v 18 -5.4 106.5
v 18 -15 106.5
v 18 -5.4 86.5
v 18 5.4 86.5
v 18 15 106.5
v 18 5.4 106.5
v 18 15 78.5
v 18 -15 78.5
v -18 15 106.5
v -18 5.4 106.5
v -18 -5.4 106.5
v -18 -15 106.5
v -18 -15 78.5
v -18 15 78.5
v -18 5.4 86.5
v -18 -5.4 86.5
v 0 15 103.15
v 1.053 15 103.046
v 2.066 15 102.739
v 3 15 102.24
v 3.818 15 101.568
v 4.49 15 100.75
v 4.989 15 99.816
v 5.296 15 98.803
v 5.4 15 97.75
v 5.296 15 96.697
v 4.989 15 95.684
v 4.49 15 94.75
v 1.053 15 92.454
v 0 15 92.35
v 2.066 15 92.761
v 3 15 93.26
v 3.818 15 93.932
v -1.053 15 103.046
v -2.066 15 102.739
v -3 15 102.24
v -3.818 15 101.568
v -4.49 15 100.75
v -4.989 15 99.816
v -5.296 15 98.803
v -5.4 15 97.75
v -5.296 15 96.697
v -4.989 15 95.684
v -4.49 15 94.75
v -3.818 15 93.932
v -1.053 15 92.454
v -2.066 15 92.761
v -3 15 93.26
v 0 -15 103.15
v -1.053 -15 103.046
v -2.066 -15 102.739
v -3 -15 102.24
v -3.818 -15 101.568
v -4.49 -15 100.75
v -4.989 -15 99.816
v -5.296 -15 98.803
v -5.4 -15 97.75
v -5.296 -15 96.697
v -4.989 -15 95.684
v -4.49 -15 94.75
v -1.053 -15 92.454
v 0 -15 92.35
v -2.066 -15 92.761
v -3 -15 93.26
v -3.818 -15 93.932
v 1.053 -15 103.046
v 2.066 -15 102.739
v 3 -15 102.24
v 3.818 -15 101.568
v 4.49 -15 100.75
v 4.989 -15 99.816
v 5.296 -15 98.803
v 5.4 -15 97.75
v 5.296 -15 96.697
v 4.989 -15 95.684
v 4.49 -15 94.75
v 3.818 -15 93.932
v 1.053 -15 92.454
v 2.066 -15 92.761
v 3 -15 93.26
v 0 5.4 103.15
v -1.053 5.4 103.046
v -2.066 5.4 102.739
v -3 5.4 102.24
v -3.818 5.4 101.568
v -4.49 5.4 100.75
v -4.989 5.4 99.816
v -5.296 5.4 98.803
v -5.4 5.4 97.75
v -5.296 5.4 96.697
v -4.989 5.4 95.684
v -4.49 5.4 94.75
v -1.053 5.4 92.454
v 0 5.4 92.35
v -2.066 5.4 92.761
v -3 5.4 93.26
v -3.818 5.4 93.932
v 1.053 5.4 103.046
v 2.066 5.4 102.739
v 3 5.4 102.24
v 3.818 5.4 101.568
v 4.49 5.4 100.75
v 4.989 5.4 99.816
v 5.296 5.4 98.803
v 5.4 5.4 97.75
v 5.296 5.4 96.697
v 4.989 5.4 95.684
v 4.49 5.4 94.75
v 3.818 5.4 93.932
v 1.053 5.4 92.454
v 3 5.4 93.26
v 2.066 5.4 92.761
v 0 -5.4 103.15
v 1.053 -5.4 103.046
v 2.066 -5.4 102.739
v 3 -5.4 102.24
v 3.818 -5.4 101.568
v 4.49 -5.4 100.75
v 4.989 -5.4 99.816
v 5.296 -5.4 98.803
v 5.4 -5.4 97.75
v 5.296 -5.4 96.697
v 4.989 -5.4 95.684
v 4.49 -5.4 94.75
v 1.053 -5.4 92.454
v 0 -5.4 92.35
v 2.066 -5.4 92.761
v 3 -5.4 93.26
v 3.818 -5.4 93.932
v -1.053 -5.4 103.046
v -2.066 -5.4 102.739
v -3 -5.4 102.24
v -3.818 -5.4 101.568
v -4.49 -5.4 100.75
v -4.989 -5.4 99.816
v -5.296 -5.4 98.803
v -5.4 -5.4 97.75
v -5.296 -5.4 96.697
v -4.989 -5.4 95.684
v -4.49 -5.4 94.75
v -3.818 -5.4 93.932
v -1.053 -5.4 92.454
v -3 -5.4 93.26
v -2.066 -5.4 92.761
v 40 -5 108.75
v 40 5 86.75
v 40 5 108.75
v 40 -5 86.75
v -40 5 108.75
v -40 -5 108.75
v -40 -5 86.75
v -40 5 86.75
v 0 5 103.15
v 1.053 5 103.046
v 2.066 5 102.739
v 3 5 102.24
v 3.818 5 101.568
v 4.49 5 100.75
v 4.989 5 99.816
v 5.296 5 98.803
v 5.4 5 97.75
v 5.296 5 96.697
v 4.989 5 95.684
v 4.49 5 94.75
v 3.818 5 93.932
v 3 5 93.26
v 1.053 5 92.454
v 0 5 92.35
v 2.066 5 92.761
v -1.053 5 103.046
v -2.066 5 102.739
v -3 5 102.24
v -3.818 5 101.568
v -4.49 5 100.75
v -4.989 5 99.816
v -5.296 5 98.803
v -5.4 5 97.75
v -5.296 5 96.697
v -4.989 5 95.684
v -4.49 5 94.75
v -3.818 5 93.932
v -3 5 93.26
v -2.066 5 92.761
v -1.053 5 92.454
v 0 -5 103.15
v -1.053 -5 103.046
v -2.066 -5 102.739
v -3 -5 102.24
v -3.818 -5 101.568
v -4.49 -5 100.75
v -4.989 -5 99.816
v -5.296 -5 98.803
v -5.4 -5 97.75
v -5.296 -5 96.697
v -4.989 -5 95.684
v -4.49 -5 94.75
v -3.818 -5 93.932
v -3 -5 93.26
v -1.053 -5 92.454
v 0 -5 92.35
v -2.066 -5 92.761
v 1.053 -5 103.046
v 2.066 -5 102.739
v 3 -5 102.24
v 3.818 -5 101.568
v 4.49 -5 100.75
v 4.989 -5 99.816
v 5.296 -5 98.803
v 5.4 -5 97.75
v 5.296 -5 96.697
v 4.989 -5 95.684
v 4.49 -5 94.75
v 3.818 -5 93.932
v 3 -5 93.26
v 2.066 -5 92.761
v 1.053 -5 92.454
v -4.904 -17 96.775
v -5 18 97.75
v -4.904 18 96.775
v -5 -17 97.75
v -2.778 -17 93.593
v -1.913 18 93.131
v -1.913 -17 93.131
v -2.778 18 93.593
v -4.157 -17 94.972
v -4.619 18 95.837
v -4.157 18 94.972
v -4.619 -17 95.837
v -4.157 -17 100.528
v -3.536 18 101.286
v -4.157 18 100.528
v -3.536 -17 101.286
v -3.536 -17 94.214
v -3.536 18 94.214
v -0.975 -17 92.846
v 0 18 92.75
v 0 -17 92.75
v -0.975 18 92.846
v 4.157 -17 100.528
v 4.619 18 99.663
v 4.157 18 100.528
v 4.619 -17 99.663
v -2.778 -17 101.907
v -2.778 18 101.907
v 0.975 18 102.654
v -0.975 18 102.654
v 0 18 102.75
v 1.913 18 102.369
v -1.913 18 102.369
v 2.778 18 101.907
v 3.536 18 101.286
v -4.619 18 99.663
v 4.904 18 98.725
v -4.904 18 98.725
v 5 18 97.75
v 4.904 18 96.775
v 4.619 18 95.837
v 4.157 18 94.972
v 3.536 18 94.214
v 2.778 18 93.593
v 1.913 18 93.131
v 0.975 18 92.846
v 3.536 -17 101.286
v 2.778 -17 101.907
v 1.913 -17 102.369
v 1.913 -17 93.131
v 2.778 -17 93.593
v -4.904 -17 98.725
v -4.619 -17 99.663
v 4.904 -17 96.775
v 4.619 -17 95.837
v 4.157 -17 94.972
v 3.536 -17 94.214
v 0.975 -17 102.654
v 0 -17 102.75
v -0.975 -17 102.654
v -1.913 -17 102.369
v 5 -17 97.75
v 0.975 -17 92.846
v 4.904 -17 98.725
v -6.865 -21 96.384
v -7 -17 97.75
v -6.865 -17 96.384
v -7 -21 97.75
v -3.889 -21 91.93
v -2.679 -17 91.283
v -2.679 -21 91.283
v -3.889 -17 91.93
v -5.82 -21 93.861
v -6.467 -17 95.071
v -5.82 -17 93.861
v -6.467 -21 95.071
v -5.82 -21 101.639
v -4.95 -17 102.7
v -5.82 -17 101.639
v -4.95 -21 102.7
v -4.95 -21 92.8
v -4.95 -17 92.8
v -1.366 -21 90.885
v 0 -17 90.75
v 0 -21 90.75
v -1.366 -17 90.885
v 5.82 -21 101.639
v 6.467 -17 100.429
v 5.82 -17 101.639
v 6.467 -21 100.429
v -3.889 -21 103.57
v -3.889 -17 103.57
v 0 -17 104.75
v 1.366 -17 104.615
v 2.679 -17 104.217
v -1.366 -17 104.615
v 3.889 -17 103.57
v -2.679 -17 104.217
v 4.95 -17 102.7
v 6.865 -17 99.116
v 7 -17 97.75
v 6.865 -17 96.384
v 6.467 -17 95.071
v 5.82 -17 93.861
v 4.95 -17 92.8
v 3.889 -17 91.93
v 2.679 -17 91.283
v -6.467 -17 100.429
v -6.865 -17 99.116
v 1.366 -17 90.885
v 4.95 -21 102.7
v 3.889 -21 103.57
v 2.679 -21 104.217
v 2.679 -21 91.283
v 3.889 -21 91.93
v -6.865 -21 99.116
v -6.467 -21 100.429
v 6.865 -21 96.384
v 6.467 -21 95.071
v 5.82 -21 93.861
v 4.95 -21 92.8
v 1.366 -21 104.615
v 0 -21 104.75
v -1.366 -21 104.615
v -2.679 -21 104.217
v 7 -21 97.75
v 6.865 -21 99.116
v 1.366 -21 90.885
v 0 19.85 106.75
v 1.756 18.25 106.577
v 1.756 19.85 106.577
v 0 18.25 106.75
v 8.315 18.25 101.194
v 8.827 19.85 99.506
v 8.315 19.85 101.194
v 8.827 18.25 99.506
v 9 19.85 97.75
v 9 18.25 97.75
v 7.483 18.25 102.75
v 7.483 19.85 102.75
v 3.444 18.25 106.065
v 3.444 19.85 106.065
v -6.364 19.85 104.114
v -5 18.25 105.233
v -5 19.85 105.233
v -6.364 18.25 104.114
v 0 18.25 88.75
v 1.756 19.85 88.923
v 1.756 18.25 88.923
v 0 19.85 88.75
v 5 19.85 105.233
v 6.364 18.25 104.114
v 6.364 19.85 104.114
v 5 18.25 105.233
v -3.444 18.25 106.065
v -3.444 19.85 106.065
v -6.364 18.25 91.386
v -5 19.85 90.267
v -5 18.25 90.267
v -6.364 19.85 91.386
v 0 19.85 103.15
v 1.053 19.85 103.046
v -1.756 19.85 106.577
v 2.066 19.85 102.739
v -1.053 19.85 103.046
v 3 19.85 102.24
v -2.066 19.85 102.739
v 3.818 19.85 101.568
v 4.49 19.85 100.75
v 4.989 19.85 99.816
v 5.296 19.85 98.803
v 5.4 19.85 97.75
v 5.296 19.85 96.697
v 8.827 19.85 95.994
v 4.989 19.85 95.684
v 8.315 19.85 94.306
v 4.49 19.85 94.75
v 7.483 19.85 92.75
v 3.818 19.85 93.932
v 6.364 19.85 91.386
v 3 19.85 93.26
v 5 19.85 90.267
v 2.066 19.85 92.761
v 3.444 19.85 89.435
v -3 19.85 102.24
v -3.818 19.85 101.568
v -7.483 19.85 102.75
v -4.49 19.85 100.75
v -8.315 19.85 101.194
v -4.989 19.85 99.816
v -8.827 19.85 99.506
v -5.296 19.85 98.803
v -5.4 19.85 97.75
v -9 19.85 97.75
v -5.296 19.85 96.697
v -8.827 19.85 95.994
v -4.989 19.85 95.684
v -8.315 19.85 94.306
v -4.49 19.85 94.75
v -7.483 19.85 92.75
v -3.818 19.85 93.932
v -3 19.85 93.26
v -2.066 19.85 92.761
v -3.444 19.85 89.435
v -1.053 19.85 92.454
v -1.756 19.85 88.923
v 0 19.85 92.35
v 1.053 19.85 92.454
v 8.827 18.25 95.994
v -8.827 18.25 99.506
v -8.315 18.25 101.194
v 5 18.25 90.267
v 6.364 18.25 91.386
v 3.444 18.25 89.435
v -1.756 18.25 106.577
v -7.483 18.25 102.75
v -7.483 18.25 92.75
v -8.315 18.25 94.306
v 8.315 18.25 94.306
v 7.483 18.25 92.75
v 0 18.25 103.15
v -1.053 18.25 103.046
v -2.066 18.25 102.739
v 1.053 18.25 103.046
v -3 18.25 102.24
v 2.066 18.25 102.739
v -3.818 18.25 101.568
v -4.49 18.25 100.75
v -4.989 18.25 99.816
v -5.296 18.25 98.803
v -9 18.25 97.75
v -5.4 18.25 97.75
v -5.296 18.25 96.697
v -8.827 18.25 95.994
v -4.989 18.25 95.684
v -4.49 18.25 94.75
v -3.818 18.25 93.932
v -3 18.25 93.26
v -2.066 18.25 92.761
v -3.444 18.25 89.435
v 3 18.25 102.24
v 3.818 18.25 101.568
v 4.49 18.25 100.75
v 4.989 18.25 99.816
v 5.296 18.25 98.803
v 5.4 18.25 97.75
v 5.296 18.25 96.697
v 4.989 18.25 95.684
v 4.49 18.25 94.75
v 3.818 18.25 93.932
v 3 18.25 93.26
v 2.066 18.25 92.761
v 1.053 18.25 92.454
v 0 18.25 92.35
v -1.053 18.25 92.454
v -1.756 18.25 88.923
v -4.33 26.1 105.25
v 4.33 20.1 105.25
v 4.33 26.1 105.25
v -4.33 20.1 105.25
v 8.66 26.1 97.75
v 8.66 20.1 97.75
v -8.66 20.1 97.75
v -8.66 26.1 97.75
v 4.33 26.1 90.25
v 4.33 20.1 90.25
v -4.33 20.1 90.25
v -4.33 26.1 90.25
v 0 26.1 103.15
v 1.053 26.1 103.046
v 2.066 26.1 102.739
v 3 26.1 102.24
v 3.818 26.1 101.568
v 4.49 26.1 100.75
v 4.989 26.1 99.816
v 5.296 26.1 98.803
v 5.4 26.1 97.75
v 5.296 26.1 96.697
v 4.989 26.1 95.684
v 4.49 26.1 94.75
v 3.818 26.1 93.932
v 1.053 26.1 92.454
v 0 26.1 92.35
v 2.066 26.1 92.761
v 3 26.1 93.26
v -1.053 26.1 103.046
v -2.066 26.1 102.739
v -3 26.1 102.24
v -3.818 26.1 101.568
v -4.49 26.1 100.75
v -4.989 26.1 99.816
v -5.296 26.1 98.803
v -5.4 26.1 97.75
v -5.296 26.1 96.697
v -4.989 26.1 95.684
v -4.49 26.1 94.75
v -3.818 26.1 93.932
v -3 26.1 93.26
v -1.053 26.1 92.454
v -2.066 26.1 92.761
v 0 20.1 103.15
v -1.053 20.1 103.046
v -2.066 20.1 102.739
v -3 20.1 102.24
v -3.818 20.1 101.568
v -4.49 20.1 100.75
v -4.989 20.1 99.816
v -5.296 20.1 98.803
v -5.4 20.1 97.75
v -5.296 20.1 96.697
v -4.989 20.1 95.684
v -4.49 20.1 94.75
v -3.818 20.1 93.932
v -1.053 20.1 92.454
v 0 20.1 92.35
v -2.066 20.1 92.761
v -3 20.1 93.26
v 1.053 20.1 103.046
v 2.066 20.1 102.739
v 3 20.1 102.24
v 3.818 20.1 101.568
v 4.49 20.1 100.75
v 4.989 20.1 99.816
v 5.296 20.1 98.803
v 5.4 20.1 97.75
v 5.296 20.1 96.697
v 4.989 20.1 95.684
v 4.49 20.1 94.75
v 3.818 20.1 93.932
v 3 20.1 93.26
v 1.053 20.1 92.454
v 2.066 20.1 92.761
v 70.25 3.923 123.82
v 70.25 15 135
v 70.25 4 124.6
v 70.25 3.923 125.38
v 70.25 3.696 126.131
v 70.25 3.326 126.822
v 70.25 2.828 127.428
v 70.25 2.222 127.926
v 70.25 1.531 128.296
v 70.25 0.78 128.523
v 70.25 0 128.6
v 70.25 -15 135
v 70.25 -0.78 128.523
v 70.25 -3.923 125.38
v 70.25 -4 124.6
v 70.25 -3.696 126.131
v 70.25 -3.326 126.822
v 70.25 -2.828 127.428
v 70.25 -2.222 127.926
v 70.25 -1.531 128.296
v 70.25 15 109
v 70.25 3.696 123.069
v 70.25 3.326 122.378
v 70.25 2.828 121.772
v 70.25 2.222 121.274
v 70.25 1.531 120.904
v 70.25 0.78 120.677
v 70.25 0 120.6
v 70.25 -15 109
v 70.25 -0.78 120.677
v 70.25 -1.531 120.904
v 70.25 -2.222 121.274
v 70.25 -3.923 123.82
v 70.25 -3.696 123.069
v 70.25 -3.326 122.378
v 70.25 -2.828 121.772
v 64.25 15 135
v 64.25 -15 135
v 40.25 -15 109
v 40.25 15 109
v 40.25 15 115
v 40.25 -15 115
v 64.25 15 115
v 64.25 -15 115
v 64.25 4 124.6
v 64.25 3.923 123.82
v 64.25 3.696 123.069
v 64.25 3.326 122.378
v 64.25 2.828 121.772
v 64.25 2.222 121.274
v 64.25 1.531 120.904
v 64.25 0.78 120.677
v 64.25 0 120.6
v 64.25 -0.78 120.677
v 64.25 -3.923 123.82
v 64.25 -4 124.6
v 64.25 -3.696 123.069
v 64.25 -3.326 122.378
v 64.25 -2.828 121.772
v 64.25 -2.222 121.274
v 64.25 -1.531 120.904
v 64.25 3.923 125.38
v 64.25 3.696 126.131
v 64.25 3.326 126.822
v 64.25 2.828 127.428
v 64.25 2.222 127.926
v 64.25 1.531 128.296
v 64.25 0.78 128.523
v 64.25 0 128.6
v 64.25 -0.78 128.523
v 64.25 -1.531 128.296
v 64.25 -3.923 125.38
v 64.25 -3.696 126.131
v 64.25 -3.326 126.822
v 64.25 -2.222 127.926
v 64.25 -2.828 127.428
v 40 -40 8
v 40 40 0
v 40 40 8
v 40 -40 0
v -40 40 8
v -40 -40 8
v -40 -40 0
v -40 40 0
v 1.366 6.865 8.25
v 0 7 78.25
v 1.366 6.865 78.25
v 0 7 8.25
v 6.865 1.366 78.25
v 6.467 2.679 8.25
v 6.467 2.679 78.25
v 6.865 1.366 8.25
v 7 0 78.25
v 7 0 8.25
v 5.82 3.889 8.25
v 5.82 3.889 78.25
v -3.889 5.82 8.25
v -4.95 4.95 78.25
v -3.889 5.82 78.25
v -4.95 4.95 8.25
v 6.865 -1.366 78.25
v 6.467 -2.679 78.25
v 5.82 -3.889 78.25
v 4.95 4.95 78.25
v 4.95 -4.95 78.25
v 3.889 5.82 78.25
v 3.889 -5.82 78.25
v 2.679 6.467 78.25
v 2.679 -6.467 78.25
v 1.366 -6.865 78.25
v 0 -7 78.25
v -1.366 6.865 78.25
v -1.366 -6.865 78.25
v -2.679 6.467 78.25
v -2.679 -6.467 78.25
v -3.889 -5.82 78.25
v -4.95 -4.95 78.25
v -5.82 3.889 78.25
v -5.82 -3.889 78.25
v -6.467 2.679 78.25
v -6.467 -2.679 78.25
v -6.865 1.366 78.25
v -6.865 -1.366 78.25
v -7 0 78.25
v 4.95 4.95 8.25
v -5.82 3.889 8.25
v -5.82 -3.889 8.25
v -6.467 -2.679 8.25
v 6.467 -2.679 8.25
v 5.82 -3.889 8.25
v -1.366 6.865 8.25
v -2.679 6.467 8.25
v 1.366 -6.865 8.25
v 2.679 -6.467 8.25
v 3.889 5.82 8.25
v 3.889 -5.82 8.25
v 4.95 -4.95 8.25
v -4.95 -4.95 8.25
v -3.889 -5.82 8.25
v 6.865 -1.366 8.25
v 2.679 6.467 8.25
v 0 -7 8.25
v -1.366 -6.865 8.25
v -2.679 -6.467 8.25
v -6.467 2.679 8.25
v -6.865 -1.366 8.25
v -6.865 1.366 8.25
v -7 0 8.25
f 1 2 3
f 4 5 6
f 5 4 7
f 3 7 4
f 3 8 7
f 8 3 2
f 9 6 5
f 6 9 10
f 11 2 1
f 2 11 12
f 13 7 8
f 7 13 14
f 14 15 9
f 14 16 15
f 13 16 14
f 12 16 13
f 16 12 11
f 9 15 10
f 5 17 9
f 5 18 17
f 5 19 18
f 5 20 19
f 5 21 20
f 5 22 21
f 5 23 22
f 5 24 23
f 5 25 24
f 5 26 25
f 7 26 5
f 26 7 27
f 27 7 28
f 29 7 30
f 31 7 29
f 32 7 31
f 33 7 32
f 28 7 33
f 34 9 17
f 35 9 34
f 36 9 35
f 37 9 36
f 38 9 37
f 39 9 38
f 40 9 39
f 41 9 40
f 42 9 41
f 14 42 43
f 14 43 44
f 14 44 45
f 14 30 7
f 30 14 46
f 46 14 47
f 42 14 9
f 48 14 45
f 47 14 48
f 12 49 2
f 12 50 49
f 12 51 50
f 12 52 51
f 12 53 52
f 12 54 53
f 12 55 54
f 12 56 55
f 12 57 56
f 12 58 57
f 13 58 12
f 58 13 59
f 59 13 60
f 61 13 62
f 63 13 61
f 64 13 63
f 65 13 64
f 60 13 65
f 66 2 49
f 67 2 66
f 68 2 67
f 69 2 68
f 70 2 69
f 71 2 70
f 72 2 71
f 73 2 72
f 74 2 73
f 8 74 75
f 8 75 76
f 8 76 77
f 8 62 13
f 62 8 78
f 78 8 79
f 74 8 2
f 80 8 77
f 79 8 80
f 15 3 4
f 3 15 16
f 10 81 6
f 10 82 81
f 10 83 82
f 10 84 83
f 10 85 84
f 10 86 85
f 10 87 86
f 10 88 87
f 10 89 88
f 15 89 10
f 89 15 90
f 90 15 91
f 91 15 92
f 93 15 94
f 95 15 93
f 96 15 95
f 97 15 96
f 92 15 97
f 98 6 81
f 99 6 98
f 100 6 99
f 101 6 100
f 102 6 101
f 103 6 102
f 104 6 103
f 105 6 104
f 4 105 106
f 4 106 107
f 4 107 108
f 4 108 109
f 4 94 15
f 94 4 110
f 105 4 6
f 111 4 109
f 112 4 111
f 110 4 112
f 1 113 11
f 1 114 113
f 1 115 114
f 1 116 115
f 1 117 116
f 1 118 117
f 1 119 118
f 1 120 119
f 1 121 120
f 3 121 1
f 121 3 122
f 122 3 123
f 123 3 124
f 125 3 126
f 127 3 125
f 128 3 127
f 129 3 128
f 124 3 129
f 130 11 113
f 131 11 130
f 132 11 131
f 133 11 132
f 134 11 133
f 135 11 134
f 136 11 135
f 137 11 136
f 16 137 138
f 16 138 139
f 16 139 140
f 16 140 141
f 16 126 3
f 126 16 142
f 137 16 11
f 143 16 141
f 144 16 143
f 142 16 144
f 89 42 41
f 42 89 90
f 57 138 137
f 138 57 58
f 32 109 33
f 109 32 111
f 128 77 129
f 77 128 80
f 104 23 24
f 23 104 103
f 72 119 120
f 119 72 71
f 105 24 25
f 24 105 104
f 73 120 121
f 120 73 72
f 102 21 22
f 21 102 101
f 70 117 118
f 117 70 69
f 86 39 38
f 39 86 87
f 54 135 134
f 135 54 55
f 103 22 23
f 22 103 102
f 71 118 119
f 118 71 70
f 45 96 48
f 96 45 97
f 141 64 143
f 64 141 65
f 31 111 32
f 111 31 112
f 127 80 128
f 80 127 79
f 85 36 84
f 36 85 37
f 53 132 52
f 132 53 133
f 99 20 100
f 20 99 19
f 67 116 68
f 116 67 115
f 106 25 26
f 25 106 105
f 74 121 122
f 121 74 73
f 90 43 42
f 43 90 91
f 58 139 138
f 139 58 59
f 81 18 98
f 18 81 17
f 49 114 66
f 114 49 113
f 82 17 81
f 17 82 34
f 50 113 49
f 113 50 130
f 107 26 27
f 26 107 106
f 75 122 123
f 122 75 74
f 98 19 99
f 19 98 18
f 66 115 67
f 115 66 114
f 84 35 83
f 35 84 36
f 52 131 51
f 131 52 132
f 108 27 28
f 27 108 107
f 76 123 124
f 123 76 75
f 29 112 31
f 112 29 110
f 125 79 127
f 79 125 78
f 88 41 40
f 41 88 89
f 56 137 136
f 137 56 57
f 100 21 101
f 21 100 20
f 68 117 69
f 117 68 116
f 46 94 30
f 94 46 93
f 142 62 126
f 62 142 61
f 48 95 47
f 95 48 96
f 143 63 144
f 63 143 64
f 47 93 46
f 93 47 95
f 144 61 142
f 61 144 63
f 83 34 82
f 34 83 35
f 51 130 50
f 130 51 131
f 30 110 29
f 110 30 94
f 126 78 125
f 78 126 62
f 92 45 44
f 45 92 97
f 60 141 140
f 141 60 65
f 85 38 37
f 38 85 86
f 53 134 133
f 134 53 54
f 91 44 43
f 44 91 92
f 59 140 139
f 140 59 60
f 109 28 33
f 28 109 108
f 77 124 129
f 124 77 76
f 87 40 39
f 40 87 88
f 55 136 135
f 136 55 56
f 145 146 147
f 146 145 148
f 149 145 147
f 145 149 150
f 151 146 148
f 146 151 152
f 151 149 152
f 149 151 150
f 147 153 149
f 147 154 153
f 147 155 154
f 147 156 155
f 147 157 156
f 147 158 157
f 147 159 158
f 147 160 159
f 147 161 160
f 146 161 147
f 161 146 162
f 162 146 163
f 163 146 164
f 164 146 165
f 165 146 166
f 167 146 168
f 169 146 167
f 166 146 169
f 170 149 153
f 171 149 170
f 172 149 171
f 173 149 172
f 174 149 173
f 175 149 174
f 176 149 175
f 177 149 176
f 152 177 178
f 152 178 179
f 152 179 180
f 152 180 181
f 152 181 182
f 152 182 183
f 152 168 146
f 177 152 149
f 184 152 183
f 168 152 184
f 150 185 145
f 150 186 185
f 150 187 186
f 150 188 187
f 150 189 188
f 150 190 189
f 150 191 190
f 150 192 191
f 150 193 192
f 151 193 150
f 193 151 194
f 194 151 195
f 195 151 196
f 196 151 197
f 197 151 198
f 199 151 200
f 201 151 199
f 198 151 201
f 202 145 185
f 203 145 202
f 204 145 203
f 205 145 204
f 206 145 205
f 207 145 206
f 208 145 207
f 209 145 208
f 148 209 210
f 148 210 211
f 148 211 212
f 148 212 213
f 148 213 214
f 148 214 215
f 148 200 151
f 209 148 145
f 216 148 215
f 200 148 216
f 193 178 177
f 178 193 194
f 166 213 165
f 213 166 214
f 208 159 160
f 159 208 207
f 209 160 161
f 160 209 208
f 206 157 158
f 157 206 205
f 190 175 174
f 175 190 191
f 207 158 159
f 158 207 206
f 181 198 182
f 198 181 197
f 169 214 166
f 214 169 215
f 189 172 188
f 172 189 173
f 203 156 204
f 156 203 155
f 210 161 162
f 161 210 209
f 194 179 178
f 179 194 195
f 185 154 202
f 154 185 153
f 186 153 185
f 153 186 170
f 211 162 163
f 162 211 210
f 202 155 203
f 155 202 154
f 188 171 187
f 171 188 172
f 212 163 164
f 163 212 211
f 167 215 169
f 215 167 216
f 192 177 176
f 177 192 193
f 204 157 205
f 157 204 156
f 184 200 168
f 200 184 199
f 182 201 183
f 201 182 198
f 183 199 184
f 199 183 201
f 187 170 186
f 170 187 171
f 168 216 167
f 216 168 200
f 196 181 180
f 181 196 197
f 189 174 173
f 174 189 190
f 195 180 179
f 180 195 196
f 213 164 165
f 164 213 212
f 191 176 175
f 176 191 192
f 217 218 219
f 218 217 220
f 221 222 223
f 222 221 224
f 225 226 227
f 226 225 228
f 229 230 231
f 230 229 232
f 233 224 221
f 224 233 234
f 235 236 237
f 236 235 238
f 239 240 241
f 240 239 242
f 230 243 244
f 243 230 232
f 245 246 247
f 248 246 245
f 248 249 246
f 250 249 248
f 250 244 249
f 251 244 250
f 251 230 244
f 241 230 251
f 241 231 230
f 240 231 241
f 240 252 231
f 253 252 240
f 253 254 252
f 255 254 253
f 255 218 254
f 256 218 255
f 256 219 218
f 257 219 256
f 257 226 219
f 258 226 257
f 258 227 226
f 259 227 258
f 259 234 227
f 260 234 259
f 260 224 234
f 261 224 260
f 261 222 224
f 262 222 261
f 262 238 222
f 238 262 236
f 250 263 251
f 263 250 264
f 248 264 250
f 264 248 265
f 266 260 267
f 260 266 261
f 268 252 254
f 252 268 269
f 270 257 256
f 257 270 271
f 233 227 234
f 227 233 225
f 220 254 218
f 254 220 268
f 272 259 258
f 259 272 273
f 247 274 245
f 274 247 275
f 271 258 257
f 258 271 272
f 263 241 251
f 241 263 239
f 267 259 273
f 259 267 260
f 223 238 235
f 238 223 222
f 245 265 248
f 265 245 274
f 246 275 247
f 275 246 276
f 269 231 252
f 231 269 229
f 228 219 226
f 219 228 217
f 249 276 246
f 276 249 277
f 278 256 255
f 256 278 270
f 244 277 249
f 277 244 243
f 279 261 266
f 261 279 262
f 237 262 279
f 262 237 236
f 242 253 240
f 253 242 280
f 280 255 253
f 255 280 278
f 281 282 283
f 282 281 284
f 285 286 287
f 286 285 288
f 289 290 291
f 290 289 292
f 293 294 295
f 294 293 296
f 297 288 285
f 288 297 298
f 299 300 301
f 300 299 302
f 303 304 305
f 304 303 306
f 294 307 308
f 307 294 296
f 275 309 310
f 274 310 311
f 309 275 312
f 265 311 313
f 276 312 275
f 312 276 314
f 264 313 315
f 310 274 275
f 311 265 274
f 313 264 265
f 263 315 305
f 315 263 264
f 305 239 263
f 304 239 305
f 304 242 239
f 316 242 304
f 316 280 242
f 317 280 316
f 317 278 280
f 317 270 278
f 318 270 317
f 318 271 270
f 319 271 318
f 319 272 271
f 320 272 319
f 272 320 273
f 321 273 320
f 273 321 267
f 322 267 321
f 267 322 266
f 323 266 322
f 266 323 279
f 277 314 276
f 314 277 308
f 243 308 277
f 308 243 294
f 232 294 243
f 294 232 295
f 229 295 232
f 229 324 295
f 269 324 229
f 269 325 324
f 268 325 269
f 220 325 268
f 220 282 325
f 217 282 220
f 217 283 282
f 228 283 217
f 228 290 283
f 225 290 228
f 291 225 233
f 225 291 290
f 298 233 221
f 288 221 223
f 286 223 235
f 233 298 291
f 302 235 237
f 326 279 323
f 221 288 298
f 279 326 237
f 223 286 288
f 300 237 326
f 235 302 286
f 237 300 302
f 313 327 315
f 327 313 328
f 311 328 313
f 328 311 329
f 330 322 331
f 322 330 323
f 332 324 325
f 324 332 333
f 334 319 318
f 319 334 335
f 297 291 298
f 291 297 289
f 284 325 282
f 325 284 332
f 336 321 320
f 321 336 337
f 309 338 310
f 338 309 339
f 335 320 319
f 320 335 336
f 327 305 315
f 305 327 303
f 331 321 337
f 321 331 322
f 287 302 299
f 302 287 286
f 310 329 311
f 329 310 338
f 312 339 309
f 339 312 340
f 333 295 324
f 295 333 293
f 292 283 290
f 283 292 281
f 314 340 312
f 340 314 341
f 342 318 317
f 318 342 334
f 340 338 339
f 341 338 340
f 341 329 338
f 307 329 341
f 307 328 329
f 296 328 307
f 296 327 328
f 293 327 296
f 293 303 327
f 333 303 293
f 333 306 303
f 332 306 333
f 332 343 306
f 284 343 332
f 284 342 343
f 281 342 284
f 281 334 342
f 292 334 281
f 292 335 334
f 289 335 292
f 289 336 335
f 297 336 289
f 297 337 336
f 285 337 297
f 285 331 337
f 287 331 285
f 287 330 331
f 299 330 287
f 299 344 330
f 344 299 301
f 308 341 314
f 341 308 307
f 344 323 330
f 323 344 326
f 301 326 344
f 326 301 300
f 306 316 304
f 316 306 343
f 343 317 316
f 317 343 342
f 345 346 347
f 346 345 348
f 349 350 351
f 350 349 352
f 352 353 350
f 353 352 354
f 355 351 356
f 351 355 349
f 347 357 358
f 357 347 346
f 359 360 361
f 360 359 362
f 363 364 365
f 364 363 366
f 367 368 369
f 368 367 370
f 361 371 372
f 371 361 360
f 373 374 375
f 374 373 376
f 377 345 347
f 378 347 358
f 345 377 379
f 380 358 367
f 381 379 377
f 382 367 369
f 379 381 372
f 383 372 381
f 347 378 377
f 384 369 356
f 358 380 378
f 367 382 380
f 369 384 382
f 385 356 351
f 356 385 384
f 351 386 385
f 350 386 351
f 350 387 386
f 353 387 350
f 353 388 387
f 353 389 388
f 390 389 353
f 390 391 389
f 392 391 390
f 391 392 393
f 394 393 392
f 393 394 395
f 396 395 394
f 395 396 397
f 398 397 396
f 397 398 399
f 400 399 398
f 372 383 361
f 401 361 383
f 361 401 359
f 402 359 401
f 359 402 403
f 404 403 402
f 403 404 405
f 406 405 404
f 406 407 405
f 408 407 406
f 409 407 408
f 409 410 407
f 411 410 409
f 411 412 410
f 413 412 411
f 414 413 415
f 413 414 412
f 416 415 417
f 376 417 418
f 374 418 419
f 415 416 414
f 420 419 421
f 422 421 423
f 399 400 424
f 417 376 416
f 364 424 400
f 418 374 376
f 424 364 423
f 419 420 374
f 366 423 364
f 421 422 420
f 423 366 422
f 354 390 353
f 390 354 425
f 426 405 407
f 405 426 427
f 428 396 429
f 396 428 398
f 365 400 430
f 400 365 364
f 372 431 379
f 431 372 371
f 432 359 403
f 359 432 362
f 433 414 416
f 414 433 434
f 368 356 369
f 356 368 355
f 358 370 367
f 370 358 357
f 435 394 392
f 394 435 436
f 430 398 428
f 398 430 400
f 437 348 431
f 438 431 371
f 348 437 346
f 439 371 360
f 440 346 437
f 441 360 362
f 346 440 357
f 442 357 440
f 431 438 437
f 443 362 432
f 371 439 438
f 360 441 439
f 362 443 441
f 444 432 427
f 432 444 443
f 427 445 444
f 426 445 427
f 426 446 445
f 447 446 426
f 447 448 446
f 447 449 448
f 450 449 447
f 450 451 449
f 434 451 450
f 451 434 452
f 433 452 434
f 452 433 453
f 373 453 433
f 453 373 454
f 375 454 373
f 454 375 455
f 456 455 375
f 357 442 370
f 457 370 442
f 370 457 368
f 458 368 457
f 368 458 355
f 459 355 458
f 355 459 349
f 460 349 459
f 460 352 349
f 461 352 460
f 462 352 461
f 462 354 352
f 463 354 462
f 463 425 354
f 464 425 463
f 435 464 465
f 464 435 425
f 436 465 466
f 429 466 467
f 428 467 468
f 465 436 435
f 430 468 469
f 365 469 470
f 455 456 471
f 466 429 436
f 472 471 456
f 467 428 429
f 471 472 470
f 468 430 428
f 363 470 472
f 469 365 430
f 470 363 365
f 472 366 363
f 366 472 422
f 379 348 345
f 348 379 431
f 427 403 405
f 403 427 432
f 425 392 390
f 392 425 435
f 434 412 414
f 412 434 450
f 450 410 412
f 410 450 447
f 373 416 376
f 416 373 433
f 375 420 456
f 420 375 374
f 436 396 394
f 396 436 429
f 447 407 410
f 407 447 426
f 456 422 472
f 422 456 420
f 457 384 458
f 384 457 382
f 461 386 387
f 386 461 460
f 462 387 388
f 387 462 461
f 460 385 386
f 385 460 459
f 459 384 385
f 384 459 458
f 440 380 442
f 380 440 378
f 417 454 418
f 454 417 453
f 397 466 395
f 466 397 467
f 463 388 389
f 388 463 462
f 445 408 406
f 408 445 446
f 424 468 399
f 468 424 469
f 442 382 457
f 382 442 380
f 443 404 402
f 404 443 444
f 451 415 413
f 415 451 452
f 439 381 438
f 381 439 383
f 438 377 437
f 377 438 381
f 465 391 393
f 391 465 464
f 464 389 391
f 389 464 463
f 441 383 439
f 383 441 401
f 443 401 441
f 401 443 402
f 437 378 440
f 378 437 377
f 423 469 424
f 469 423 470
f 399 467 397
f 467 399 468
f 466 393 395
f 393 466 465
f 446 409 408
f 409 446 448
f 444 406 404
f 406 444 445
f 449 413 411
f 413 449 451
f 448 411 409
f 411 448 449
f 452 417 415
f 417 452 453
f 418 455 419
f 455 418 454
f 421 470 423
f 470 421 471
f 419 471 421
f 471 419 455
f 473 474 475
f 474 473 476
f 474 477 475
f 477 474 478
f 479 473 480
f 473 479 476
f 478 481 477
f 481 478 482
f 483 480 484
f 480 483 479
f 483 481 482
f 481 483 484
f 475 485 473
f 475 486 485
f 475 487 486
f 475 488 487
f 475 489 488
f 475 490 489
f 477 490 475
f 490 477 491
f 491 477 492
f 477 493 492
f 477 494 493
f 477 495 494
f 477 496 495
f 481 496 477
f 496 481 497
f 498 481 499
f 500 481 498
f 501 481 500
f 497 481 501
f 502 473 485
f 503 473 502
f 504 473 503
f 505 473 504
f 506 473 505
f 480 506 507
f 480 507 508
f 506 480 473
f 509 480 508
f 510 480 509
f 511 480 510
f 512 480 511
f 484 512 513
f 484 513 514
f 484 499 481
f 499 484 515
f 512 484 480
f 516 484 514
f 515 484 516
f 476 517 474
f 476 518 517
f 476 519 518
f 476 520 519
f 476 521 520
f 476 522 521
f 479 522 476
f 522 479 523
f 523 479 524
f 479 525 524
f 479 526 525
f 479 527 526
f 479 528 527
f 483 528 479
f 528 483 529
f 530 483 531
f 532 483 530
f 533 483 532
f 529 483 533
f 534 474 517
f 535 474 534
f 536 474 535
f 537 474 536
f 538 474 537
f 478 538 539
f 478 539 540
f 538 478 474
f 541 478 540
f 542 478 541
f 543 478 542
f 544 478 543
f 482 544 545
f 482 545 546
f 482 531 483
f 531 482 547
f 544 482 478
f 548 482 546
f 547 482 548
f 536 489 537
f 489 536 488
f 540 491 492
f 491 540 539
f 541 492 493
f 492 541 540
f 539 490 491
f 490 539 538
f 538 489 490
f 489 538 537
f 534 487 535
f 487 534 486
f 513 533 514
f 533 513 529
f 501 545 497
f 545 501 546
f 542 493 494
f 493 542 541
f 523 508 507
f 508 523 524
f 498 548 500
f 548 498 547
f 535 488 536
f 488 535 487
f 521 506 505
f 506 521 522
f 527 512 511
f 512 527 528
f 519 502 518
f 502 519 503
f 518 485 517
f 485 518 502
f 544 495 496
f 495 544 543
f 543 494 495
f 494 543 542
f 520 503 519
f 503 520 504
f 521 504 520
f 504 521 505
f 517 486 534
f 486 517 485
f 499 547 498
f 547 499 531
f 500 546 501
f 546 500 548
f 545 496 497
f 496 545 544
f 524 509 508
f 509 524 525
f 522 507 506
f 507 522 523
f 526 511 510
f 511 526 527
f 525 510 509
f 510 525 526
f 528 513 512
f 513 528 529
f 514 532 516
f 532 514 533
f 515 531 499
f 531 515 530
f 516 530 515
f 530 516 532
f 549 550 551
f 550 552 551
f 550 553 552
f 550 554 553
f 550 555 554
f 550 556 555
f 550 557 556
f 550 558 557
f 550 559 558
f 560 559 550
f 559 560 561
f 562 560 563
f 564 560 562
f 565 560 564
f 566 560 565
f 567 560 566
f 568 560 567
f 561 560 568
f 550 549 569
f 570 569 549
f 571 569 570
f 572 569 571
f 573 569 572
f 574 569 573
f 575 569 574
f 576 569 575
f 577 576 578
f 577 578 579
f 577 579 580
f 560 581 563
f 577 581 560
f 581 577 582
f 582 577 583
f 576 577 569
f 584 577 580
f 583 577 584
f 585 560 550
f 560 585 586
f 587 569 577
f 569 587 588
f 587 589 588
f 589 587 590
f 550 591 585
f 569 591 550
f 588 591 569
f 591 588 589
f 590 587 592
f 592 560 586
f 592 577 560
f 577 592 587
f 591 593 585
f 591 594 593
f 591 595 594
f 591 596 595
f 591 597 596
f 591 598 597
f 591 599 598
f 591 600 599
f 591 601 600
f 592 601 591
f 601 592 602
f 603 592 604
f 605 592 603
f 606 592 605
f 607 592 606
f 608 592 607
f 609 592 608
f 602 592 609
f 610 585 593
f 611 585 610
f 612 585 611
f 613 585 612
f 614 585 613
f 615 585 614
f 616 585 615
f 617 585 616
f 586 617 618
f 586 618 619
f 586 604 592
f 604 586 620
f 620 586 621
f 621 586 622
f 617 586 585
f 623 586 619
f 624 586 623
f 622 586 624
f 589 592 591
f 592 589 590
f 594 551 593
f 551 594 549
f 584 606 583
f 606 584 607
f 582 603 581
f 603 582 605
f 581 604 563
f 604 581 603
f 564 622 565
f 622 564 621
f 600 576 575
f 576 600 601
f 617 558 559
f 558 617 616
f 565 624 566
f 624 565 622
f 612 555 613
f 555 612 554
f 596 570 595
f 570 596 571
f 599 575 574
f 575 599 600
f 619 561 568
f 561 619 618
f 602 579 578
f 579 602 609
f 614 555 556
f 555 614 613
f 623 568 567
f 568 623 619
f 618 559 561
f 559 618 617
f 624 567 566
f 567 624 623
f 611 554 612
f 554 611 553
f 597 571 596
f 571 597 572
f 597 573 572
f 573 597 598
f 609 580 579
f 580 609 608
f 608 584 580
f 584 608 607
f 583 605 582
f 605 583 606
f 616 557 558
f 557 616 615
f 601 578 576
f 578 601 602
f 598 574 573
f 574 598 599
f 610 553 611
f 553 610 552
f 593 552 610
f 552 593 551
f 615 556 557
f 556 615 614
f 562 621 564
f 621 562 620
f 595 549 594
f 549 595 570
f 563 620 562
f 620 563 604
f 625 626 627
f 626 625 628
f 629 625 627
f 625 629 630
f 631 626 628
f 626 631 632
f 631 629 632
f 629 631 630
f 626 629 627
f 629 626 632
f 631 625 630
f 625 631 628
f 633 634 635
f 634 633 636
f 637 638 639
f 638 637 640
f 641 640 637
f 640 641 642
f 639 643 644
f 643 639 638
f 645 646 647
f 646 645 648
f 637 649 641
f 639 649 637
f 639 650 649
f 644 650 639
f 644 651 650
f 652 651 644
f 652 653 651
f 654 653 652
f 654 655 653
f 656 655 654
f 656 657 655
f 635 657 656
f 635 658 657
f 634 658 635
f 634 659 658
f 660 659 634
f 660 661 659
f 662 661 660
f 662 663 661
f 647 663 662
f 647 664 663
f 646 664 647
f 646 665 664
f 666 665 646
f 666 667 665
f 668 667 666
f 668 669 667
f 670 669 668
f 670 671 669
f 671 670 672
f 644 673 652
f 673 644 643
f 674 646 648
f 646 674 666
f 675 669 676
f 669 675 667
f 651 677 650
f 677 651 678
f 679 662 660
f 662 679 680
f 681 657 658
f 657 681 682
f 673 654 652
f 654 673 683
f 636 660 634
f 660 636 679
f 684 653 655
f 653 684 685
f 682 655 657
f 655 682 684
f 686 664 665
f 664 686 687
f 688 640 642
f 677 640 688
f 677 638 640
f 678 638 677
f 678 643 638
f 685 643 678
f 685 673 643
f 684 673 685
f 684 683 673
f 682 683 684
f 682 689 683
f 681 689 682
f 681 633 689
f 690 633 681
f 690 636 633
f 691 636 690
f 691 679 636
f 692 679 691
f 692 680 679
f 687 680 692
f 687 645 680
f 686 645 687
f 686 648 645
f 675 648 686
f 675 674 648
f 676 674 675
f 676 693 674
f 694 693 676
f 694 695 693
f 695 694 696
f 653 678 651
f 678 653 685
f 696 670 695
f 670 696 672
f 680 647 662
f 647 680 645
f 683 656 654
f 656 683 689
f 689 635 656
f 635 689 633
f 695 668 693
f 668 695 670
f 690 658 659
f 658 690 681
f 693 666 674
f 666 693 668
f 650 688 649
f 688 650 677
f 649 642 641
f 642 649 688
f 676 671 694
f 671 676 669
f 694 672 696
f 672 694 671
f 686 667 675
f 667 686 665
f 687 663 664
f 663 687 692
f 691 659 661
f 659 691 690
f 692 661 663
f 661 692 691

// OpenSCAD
$fn = 32;

// ------------------------------------------------------------------------
// Lamp arm: column d14 x 70 mm, arm 80 mm
// Every part is its own module, assembly() places every instance.
// ------------------------------------------------------------------------

// --- part 1 ---
module lamp_base() {
  difference() {
    translate([-40, -40, 0]) cube([80, 80, 8]);
  }
}

// --- part 2 ---
module lamp_column() {
  cylinder(h = 70, d = 14);
}

// --- part 3 ---
module head_fork() {
  difference() {
    translate([-18, -15, 0]) cube([36, 30, 28]);
    translate([-19, -5.4, 8]) cube([38, 10.8, 21]);
    translate([0, 0, 19.25]) rotate([90, 0, 0]) cylinder(h = 32, d = 10.8, center = true);
  }
}

// --- part 4 ---
module lamp_arm() {
  difference() {
    translate([-40, -5, 0]) cube([80, 10, 22]);
    translate([0, 0, 11]) rotate([90, 0, 0]) cylinder(h = 12, d = 10.8, center = true);
  }
}

// --- part 5 ---
module arm_pin() {
  rotate([0, 90, 0]) cylinder(h = 36, d = 10, center = true);
  translate([-21, 0, 0]) rotate([0, 90, 0]) cylinder(h = 4, d = 14);
}

// --- part 6 ---
module arm_washer() {
  difference() {
      translate([0, 0, 0]) cylinder(h = 1.6, d = 18);
      translate([0, 0, -1]) cylinder(h = 3.6, d = 10.8);
    }
}

// --- part 7 ---
module arm_nut() {
  difference() {
    linear_extrude(height = 6) polygon(points = [[8.66, 0], [4.33, 7.5], [-4.33, 7.5], [-8.66, 0], [-4.33, -7.5], [4.33, -7.5]]);
    translate([0, 0, -1]) cylinder(h = 8, d = 10.8);
  }
}

// --- part 8 ---
module shade_bracket() {
  difference() {
    translate([-15, -15, 0]) cube([30, 30, 26]);
    translate([-16, -16, 6]) cube([25, 32, 21]);
    translate([12, 0, 15.6]) rotate([0, 90, 0]) cylinder(h = 8, d = 8, center = true);
  }
}

// --- assembly ---
module assembly() {
  color([0.80, 0.24, 0.20]) translate([0, 0, 0]) rotate([0, 0, 0]) lamp_base();
  color([0.20, 0.45, 0.75]) translate([0, 0, 8.25]) rotate([0, 0, 0]) lamp_column();
  color([0.25, 0.62, 0.32]) translate([0, 0, 78.5]) rotate([0, 0, 0]) head_fork();
  color([0.92, 0.70, 0.18]) translate([0, 0, 86.75]) rotate([0, 0, 0]) lamp_arm();
  color([0.58, 0.35, 0.70]) translate([0, 0, 97.75]) rotate([0, 0, 90]) arm_pin();
  color([0.16, 0.66, 0.66]) translate([0, 19.85, 97.75]) rotate([90, 0, 0]) arm_washer();
  color([0.85, 0.48, 0.18]) translate([0, 26.1, 97.75]) rotate([90, 0, 0]) arm_nut();
  color([0.55, 0.60, 0.65]) translate([55.25, 0, 109]) rotate([0, 0, 0]) shade_bracket();
}

assembly();
